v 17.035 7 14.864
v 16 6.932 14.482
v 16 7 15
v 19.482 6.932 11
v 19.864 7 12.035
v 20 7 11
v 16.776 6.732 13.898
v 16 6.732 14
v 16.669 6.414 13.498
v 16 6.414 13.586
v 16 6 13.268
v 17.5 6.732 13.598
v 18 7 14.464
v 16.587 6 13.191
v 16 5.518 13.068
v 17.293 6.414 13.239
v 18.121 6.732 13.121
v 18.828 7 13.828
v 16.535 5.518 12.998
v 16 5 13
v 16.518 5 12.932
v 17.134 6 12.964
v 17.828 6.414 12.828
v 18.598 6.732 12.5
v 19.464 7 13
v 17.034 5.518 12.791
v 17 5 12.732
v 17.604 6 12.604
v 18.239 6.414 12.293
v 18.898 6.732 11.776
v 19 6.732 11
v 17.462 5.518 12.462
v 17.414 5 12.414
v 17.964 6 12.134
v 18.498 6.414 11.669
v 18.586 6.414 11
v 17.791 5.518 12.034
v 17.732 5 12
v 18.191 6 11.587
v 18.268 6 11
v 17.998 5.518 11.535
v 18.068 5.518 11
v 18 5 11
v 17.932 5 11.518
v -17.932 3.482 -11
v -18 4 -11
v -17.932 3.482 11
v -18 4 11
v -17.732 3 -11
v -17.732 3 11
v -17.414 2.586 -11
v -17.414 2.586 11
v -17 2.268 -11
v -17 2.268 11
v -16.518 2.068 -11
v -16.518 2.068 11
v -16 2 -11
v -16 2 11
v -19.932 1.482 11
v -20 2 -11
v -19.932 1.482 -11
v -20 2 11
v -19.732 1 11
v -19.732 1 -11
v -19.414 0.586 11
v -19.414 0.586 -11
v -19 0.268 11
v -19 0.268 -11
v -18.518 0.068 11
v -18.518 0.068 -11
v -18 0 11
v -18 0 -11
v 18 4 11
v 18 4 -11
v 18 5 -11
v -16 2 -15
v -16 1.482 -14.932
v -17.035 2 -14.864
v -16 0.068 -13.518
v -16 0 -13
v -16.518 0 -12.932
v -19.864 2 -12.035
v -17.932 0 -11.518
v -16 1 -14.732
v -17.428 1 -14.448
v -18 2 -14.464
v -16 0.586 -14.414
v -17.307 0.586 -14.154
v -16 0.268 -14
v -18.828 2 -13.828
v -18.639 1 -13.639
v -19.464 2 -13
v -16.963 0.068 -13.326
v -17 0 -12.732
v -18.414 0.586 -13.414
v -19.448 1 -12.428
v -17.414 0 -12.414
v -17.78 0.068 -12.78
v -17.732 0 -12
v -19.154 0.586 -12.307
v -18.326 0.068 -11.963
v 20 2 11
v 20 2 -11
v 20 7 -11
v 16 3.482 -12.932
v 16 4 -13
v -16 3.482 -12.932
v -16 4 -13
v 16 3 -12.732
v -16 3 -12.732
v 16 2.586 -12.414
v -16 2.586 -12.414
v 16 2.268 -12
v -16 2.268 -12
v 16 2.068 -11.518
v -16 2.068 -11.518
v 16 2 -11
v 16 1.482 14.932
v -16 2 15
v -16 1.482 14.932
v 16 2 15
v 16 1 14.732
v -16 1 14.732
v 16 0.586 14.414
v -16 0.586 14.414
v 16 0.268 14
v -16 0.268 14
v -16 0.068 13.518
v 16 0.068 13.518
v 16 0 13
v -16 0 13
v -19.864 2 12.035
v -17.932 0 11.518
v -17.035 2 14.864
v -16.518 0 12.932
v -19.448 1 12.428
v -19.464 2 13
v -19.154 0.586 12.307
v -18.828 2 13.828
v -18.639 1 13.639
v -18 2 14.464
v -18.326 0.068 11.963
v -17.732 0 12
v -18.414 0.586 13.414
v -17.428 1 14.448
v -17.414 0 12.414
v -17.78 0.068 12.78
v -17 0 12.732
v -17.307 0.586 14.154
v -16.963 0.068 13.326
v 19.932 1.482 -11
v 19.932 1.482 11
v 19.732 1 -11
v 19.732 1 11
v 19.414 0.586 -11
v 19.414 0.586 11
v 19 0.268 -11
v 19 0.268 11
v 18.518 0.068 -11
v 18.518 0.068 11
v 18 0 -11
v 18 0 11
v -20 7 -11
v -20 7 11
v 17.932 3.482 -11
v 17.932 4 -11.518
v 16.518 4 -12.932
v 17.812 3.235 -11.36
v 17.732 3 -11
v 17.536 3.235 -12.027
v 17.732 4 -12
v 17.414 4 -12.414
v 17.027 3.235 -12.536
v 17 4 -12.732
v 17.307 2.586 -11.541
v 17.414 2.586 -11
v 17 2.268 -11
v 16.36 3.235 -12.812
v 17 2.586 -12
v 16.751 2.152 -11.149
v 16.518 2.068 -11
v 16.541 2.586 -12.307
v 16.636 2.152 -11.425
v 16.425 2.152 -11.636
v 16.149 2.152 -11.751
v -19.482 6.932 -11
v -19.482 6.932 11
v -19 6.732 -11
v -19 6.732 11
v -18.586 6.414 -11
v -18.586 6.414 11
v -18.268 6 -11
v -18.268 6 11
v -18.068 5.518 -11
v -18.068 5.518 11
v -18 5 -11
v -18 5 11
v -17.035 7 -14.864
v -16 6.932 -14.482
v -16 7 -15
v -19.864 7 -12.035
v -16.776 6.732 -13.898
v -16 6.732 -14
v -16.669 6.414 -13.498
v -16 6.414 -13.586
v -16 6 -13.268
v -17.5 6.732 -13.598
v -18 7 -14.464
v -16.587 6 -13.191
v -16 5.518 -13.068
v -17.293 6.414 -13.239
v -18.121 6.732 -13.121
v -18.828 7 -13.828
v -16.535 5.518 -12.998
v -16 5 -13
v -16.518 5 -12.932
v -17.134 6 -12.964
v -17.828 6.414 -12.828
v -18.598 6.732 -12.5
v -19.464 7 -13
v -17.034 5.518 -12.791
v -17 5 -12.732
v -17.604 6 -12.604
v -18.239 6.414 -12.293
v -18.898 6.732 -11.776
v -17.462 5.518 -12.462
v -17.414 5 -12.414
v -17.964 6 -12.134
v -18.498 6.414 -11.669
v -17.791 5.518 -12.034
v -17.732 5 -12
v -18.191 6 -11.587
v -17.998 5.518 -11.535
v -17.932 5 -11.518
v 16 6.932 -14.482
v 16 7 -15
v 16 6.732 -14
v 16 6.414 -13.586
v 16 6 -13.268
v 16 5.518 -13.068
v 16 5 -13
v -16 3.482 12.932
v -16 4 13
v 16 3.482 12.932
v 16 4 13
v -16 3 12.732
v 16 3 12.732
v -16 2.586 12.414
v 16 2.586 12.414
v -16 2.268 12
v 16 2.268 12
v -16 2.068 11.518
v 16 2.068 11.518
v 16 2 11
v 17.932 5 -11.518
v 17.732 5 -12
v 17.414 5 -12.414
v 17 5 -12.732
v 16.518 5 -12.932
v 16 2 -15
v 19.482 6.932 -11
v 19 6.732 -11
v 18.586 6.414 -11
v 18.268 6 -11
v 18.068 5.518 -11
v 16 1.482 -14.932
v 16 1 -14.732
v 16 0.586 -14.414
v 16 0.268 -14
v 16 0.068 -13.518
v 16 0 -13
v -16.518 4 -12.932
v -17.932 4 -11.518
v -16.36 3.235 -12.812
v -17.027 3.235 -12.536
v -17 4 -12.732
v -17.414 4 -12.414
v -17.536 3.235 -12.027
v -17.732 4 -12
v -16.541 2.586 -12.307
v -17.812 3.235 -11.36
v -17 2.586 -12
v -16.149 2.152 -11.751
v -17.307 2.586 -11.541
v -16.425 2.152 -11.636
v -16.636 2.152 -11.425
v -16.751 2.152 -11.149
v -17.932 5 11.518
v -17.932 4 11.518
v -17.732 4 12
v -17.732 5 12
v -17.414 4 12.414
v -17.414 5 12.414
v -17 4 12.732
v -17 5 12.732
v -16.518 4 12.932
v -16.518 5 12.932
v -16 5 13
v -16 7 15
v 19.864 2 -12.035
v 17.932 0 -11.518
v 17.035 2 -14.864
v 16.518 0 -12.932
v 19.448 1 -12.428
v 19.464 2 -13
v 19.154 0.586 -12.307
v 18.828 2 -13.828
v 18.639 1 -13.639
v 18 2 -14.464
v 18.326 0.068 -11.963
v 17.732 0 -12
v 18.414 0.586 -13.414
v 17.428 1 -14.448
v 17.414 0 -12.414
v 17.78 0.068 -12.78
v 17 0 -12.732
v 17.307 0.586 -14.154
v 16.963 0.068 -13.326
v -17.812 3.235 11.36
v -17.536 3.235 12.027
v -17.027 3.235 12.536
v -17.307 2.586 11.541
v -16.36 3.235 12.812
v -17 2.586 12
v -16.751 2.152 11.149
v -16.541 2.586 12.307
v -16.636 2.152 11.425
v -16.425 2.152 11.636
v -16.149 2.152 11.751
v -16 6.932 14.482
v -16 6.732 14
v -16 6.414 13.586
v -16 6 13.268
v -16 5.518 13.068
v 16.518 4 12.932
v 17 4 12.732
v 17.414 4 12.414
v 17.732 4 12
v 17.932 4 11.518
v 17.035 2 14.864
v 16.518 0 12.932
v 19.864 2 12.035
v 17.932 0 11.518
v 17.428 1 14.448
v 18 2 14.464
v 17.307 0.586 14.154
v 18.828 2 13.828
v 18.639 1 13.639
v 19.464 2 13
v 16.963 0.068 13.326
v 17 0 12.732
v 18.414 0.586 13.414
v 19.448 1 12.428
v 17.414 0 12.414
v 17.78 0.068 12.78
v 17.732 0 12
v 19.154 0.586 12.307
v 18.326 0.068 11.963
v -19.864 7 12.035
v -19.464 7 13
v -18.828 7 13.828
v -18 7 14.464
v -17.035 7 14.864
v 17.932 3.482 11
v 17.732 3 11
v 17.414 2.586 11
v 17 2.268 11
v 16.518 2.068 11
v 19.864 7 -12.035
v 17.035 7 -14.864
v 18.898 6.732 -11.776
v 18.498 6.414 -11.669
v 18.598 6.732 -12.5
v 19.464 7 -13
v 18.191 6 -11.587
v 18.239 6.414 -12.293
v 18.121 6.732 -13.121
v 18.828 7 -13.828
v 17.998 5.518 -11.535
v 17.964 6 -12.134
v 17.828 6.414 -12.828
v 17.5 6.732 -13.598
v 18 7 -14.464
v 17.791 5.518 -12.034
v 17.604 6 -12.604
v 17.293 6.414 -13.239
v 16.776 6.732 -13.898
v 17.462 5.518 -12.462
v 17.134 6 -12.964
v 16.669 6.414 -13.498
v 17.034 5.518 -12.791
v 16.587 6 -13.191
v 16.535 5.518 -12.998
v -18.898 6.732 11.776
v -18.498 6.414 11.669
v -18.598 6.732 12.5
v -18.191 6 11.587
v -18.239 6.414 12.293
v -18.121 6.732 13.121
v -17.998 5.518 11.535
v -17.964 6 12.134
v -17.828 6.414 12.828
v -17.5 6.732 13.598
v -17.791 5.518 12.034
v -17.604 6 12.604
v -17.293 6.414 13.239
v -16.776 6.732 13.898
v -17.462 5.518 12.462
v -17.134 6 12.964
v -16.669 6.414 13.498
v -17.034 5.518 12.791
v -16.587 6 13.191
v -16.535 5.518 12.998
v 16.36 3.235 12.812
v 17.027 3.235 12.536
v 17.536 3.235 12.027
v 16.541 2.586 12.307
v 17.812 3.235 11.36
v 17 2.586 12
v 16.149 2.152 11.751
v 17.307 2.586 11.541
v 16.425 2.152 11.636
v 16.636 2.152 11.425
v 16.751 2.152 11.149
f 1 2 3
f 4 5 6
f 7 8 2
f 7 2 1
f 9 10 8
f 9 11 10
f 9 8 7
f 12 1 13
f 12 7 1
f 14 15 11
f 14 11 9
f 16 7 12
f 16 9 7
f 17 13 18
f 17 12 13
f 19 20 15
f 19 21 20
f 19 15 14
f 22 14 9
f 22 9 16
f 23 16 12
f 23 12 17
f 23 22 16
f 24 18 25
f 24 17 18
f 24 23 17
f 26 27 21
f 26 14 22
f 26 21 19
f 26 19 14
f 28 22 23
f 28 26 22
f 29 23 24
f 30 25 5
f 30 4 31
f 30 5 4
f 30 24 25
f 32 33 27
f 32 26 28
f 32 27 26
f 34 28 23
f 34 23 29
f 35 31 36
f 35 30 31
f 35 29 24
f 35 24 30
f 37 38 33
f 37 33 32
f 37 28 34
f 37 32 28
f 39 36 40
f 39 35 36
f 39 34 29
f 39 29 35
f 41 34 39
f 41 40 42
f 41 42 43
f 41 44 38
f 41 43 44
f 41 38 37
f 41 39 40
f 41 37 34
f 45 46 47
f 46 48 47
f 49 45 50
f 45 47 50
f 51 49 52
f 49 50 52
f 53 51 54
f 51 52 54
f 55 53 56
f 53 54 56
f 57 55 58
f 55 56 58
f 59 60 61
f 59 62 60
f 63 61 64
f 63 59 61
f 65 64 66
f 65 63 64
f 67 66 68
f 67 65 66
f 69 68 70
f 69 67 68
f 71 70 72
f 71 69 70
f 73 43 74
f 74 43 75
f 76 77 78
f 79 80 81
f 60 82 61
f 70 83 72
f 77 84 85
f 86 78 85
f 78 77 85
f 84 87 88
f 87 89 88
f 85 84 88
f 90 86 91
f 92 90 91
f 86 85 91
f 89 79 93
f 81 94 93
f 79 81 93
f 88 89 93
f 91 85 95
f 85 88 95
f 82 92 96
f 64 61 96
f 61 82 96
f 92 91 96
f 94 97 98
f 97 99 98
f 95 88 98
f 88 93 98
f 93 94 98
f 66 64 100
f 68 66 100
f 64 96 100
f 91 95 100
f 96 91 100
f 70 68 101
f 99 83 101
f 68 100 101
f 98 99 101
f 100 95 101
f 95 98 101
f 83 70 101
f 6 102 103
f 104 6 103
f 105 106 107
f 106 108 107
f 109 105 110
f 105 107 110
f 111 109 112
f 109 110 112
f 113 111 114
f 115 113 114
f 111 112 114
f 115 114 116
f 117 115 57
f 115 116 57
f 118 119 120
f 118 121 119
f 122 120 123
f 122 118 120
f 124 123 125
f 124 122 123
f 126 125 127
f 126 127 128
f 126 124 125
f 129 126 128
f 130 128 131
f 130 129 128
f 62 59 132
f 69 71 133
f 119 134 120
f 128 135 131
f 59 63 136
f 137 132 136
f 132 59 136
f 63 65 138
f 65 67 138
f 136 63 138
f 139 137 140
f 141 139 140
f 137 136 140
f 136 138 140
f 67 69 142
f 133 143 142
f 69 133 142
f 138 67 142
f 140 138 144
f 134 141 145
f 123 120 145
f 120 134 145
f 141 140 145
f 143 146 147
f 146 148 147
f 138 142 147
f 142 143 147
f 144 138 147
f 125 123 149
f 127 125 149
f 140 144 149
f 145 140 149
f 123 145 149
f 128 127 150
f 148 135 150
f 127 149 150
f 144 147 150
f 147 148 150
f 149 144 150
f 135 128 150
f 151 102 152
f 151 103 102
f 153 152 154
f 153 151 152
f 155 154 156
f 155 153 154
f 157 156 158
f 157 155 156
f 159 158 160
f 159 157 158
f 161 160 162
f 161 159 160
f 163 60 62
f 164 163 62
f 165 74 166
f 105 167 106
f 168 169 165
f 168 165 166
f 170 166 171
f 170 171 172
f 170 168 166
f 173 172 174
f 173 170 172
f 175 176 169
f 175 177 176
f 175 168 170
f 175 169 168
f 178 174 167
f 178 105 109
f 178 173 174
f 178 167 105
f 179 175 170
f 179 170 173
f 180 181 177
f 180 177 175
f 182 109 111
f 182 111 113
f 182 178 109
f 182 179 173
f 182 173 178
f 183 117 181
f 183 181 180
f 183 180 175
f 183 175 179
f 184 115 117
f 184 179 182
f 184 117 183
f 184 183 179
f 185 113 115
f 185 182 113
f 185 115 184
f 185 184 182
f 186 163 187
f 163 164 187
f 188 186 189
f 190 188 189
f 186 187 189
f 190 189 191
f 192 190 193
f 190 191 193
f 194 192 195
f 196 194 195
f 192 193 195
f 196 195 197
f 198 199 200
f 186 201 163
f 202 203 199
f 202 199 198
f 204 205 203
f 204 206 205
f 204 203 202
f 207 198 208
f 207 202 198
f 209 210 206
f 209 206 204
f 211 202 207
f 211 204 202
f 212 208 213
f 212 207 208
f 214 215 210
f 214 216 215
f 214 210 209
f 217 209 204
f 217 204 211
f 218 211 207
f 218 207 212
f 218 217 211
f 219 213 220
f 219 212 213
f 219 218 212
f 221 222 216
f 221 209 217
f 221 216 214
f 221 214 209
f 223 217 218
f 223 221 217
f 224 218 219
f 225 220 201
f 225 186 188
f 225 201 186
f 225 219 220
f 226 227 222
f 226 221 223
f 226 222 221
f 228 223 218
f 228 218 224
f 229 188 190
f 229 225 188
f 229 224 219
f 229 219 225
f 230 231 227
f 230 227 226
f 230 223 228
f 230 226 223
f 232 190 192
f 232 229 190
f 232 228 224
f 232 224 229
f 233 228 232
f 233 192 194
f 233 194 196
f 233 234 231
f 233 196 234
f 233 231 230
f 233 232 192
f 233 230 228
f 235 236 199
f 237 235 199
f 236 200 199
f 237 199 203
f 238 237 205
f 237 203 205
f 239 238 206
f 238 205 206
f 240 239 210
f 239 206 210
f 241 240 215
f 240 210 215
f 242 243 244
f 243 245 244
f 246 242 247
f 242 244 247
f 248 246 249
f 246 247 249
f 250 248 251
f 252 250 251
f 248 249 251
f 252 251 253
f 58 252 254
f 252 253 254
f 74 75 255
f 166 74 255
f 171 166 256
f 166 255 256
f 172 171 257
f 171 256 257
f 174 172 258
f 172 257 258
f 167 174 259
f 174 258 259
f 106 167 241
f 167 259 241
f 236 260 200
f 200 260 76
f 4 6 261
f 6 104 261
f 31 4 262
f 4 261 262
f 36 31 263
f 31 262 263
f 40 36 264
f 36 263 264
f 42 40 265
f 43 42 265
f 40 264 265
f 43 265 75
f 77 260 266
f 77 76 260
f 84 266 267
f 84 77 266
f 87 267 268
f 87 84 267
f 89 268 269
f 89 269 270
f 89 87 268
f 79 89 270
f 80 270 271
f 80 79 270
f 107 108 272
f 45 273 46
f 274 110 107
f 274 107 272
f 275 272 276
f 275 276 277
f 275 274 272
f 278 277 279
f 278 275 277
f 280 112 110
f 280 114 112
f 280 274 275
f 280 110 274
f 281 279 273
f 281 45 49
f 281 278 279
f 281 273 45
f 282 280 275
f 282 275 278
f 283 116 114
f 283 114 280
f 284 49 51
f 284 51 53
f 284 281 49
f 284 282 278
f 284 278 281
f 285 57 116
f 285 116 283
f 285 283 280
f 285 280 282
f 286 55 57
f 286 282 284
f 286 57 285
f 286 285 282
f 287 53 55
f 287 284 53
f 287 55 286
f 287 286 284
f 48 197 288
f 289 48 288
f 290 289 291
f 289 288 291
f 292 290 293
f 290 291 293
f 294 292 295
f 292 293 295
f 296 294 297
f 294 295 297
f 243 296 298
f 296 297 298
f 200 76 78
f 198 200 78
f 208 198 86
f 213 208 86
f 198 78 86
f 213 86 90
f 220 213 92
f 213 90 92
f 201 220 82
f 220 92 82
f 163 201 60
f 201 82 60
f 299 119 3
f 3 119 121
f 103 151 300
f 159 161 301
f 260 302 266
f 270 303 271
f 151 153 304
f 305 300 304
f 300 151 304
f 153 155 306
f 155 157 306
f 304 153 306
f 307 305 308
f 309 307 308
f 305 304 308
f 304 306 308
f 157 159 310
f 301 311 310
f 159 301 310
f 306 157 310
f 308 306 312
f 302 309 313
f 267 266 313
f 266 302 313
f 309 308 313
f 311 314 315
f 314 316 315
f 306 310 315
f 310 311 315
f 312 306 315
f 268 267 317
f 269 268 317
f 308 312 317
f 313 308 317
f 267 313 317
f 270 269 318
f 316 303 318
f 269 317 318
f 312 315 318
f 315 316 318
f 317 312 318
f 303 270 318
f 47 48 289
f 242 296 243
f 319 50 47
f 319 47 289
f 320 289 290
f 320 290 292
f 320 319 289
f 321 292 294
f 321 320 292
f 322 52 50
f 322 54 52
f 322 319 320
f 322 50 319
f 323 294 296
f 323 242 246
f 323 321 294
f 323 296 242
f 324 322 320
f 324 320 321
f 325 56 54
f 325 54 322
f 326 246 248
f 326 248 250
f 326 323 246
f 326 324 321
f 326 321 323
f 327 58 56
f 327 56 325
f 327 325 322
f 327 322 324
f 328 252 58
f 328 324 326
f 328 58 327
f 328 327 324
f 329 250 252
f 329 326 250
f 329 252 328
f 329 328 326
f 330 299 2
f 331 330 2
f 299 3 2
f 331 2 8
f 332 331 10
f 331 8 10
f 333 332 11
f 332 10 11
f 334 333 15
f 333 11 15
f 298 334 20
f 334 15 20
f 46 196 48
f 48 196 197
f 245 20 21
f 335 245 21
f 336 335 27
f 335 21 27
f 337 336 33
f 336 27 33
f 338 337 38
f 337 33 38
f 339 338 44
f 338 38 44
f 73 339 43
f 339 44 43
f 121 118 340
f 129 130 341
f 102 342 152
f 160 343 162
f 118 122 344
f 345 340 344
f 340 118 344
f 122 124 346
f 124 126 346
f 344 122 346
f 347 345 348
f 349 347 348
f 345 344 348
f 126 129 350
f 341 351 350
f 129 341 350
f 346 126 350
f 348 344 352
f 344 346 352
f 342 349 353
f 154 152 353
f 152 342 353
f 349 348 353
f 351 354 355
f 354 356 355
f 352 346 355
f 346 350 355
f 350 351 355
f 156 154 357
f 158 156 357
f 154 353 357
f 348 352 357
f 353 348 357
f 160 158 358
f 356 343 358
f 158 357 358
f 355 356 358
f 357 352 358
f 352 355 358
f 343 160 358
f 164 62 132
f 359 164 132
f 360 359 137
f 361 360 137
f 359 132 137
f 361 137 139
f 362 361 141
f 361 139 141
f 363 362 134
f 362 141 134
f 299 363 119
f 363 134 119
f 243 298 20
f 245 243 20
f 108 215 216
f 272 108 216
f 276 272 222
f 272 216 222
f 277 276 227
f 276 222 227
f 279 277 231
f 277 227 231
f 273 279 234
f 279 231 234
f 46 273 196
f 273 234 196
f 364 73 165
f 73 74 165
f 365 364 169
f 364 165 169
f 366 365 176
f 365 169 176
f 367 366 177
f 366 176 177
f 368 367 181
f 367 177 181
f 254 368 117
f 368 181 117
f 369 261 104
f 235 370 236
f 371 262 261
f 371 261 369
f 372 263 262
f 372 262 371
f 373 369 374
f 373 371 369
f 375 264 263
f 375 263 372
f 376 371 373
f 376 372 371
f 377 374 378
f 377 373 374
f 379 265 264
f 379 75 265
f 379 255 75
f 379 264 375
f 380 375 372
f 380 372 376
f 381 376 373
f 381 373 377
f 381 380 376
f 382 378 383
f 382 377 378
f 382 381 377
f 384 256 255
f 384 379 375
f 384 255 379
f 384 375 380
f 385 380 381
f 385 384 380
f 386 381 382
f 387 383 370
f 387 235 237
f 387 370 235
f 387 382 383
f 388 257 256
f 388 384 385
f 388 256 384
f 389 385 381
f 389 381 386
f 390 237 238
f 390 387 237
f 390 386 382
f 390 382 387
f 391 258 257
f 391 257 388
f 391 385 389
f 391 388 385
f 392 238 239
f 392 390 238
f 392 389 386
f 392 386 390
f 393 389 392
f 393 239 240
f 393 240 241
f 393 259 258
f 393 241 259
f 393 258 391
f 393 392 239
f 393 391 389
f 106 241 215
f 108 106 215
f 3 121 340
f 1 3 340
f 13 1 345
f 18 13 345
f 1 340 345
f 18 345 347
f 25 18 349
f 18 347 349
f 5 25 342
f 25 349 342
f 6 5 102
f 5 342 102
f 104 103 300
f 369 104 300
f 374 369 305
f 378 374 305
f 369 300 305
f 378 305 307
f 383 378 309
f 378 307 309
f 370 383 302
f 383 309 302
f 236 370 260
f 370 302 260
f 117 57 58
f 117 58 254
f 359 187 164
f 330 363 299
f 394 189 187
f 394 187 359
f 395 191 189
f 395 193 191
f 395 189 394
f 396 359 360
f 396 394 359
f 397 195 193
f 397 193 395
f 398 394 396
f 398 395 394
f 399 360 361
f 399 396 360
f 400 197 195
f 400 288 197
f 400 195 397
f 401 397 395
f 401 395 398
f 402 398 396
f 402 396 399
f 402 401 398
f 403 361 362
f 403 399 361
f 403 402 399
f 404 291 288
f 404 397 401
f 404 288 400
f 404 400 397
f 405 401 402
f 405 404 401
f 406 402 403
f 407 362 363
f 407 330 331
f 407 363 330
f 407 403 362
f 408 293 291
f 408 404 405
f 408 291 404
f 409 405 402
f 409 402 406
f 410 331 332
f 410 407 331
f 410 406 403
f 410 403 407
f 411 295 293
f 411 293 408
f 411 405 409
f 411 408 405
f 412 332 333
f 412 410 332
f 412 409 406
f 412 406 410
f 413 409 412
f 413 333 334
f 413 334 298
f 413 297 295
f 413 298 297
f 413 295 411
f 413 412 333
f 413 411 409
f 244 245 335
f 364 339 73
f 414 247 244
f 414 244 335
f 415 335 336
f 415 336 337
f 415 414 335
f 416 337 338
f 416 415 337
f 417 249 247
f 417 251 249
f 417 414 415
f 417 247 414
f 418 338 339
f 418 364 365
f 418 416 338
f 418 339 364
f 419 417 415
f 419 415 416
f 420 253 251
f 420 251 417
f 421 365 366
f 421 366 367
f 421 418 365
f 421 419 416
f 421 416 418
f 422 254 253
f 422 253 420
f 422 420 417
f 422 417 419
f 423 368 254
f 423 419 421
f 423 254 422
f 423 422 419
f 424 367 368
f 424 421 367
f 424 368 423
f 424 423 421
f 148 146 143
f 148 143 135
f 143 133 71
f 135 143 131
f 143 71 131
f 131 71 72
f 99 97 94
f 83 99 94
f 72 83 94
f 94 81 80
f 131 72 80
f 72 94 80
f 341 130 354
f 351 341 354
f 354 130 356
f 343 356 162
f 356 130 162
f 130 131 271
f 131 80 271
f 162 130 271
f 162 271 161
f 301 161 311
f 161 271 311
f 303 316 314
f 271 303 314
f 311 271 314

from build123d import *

# Parameters (mm, degrees)
BOSS_EXTRU_1_DEPTH      = 7
ENL_V_MAT_EXTRU_1_DEPTH = 5
CONG_1_R                = 2
CONG_2_R                = 2
CONG_3_R                = 2


with BuildPart() as part:
    # Esquisse1 → Boss.-Extru.1 (new body)
    with BuildSketch(Plane(origin=(0, 0, 0), x_dir=(1, 0, 0), z_dir=(0, 1, 0))):
        with BuildLine():
            Line((-16, -15), (16, -15))
            ThreePointArc((16, -15), (18.828427125, -13.828427125), (20, -11))
            Line((20, -11), (20, 11))
            ThreePointArc((20, 11), (18.828427125, 13.828427125), (16, 15))
            Line((16, 15), (-16, 15))
            ThreePointArc((-16, 15), (-18.828427125, 13.828427125), (-20, 11))
            Line((-20, 11), (-20, -11))
            ThreePointArc((-20, -11), (-18.828427125, -13.828427125), (-16, -15))
        make_face()
    extrude(amount=BOSS_EXTRU_1_DEPTH)

    # Esquisse2 → Enlèv. mat.-Extru.1 (cut)
    with BuildSketch(Plane(origin=(0, 7, 0), x_dir=(1, 0, 0), z_dir=(0, 1, 0))):
        with BuildLine():
            Line((18, -11), (18, 11))
            ThreePointArc((18, 11), (17.414213562, 12.414213562), (16, 13))
            Line((16, 13), (-16, 13))
            ThreePointArc((-16, 13), (-17.414213562, 12.414213562), (-18, 11))
            Line((-18, 11), (-18, -11))
            ThreePointArc((-18, -11), (-17.414213562, -12.414213562), (-16, -13))
            Line((-16, -13), (16, -13))
            ThreePointArc((16, -13), (17.414213562, -12.414213562), (18, -11))
        make_face()
    extrude(amount=-ENL_V_MAT_EXTRU_1_DEPTH, mode=Mode.SUBTRACT)

    # Congé1
    cong_1_edges = [part.edges().sort_by_distance(p)[0] for p in [
        (17.414213562, 2, -12.414213562),
        (18, 2, 0),
        (17.414213562, 2, 12.414213562),
        (0, 2, 13),
        (-17.414213562, 2, 12.414213562),
        (-18, 2, 0),
        (-17.414213562, 2, -12.414213562),
        (0, 2, -13),
    ]]
    fillet(cong_1_edges, radius=CONG_1_R)

    # Congé2
    cong_2_edges = [part.edges().sort_by_distance(p)[0] for p in [
        (0, 0, 15),
        (-18.828427125, 0, 13.828427125),
        (-20, 0, 0),
        (-18.828427125, 0, -13.828427125),
        (0, 0, -15),
        (18.828427125, 0, -13.828427125),
        (20, 0, 0),
        (18.828427125, 0, 13.828427125),
    ]]
    fillet(cong_2_edges, radius=CONG_2_R)

    # Congé3
    cong_3_edges = [part.edges().sort_by_distance(p)[0] for p in [
        (17.414213562, 7, -12.414213562),
        (0, 7, -13),
        (-17.414213562, 7, -12.414213562),
        (-18, 7, 0),
        (-17.414213562, 7, 12.414213562),
        (0, 7, 13),
        (17.414213562, 7, 12.414213562),
        (18, 7, 0),
    ]]
    fillet(cong_3_edges, radius=CONG_3_R - 0.0001)  # a hair under: the kernel refuses the full size


solid = part.part
